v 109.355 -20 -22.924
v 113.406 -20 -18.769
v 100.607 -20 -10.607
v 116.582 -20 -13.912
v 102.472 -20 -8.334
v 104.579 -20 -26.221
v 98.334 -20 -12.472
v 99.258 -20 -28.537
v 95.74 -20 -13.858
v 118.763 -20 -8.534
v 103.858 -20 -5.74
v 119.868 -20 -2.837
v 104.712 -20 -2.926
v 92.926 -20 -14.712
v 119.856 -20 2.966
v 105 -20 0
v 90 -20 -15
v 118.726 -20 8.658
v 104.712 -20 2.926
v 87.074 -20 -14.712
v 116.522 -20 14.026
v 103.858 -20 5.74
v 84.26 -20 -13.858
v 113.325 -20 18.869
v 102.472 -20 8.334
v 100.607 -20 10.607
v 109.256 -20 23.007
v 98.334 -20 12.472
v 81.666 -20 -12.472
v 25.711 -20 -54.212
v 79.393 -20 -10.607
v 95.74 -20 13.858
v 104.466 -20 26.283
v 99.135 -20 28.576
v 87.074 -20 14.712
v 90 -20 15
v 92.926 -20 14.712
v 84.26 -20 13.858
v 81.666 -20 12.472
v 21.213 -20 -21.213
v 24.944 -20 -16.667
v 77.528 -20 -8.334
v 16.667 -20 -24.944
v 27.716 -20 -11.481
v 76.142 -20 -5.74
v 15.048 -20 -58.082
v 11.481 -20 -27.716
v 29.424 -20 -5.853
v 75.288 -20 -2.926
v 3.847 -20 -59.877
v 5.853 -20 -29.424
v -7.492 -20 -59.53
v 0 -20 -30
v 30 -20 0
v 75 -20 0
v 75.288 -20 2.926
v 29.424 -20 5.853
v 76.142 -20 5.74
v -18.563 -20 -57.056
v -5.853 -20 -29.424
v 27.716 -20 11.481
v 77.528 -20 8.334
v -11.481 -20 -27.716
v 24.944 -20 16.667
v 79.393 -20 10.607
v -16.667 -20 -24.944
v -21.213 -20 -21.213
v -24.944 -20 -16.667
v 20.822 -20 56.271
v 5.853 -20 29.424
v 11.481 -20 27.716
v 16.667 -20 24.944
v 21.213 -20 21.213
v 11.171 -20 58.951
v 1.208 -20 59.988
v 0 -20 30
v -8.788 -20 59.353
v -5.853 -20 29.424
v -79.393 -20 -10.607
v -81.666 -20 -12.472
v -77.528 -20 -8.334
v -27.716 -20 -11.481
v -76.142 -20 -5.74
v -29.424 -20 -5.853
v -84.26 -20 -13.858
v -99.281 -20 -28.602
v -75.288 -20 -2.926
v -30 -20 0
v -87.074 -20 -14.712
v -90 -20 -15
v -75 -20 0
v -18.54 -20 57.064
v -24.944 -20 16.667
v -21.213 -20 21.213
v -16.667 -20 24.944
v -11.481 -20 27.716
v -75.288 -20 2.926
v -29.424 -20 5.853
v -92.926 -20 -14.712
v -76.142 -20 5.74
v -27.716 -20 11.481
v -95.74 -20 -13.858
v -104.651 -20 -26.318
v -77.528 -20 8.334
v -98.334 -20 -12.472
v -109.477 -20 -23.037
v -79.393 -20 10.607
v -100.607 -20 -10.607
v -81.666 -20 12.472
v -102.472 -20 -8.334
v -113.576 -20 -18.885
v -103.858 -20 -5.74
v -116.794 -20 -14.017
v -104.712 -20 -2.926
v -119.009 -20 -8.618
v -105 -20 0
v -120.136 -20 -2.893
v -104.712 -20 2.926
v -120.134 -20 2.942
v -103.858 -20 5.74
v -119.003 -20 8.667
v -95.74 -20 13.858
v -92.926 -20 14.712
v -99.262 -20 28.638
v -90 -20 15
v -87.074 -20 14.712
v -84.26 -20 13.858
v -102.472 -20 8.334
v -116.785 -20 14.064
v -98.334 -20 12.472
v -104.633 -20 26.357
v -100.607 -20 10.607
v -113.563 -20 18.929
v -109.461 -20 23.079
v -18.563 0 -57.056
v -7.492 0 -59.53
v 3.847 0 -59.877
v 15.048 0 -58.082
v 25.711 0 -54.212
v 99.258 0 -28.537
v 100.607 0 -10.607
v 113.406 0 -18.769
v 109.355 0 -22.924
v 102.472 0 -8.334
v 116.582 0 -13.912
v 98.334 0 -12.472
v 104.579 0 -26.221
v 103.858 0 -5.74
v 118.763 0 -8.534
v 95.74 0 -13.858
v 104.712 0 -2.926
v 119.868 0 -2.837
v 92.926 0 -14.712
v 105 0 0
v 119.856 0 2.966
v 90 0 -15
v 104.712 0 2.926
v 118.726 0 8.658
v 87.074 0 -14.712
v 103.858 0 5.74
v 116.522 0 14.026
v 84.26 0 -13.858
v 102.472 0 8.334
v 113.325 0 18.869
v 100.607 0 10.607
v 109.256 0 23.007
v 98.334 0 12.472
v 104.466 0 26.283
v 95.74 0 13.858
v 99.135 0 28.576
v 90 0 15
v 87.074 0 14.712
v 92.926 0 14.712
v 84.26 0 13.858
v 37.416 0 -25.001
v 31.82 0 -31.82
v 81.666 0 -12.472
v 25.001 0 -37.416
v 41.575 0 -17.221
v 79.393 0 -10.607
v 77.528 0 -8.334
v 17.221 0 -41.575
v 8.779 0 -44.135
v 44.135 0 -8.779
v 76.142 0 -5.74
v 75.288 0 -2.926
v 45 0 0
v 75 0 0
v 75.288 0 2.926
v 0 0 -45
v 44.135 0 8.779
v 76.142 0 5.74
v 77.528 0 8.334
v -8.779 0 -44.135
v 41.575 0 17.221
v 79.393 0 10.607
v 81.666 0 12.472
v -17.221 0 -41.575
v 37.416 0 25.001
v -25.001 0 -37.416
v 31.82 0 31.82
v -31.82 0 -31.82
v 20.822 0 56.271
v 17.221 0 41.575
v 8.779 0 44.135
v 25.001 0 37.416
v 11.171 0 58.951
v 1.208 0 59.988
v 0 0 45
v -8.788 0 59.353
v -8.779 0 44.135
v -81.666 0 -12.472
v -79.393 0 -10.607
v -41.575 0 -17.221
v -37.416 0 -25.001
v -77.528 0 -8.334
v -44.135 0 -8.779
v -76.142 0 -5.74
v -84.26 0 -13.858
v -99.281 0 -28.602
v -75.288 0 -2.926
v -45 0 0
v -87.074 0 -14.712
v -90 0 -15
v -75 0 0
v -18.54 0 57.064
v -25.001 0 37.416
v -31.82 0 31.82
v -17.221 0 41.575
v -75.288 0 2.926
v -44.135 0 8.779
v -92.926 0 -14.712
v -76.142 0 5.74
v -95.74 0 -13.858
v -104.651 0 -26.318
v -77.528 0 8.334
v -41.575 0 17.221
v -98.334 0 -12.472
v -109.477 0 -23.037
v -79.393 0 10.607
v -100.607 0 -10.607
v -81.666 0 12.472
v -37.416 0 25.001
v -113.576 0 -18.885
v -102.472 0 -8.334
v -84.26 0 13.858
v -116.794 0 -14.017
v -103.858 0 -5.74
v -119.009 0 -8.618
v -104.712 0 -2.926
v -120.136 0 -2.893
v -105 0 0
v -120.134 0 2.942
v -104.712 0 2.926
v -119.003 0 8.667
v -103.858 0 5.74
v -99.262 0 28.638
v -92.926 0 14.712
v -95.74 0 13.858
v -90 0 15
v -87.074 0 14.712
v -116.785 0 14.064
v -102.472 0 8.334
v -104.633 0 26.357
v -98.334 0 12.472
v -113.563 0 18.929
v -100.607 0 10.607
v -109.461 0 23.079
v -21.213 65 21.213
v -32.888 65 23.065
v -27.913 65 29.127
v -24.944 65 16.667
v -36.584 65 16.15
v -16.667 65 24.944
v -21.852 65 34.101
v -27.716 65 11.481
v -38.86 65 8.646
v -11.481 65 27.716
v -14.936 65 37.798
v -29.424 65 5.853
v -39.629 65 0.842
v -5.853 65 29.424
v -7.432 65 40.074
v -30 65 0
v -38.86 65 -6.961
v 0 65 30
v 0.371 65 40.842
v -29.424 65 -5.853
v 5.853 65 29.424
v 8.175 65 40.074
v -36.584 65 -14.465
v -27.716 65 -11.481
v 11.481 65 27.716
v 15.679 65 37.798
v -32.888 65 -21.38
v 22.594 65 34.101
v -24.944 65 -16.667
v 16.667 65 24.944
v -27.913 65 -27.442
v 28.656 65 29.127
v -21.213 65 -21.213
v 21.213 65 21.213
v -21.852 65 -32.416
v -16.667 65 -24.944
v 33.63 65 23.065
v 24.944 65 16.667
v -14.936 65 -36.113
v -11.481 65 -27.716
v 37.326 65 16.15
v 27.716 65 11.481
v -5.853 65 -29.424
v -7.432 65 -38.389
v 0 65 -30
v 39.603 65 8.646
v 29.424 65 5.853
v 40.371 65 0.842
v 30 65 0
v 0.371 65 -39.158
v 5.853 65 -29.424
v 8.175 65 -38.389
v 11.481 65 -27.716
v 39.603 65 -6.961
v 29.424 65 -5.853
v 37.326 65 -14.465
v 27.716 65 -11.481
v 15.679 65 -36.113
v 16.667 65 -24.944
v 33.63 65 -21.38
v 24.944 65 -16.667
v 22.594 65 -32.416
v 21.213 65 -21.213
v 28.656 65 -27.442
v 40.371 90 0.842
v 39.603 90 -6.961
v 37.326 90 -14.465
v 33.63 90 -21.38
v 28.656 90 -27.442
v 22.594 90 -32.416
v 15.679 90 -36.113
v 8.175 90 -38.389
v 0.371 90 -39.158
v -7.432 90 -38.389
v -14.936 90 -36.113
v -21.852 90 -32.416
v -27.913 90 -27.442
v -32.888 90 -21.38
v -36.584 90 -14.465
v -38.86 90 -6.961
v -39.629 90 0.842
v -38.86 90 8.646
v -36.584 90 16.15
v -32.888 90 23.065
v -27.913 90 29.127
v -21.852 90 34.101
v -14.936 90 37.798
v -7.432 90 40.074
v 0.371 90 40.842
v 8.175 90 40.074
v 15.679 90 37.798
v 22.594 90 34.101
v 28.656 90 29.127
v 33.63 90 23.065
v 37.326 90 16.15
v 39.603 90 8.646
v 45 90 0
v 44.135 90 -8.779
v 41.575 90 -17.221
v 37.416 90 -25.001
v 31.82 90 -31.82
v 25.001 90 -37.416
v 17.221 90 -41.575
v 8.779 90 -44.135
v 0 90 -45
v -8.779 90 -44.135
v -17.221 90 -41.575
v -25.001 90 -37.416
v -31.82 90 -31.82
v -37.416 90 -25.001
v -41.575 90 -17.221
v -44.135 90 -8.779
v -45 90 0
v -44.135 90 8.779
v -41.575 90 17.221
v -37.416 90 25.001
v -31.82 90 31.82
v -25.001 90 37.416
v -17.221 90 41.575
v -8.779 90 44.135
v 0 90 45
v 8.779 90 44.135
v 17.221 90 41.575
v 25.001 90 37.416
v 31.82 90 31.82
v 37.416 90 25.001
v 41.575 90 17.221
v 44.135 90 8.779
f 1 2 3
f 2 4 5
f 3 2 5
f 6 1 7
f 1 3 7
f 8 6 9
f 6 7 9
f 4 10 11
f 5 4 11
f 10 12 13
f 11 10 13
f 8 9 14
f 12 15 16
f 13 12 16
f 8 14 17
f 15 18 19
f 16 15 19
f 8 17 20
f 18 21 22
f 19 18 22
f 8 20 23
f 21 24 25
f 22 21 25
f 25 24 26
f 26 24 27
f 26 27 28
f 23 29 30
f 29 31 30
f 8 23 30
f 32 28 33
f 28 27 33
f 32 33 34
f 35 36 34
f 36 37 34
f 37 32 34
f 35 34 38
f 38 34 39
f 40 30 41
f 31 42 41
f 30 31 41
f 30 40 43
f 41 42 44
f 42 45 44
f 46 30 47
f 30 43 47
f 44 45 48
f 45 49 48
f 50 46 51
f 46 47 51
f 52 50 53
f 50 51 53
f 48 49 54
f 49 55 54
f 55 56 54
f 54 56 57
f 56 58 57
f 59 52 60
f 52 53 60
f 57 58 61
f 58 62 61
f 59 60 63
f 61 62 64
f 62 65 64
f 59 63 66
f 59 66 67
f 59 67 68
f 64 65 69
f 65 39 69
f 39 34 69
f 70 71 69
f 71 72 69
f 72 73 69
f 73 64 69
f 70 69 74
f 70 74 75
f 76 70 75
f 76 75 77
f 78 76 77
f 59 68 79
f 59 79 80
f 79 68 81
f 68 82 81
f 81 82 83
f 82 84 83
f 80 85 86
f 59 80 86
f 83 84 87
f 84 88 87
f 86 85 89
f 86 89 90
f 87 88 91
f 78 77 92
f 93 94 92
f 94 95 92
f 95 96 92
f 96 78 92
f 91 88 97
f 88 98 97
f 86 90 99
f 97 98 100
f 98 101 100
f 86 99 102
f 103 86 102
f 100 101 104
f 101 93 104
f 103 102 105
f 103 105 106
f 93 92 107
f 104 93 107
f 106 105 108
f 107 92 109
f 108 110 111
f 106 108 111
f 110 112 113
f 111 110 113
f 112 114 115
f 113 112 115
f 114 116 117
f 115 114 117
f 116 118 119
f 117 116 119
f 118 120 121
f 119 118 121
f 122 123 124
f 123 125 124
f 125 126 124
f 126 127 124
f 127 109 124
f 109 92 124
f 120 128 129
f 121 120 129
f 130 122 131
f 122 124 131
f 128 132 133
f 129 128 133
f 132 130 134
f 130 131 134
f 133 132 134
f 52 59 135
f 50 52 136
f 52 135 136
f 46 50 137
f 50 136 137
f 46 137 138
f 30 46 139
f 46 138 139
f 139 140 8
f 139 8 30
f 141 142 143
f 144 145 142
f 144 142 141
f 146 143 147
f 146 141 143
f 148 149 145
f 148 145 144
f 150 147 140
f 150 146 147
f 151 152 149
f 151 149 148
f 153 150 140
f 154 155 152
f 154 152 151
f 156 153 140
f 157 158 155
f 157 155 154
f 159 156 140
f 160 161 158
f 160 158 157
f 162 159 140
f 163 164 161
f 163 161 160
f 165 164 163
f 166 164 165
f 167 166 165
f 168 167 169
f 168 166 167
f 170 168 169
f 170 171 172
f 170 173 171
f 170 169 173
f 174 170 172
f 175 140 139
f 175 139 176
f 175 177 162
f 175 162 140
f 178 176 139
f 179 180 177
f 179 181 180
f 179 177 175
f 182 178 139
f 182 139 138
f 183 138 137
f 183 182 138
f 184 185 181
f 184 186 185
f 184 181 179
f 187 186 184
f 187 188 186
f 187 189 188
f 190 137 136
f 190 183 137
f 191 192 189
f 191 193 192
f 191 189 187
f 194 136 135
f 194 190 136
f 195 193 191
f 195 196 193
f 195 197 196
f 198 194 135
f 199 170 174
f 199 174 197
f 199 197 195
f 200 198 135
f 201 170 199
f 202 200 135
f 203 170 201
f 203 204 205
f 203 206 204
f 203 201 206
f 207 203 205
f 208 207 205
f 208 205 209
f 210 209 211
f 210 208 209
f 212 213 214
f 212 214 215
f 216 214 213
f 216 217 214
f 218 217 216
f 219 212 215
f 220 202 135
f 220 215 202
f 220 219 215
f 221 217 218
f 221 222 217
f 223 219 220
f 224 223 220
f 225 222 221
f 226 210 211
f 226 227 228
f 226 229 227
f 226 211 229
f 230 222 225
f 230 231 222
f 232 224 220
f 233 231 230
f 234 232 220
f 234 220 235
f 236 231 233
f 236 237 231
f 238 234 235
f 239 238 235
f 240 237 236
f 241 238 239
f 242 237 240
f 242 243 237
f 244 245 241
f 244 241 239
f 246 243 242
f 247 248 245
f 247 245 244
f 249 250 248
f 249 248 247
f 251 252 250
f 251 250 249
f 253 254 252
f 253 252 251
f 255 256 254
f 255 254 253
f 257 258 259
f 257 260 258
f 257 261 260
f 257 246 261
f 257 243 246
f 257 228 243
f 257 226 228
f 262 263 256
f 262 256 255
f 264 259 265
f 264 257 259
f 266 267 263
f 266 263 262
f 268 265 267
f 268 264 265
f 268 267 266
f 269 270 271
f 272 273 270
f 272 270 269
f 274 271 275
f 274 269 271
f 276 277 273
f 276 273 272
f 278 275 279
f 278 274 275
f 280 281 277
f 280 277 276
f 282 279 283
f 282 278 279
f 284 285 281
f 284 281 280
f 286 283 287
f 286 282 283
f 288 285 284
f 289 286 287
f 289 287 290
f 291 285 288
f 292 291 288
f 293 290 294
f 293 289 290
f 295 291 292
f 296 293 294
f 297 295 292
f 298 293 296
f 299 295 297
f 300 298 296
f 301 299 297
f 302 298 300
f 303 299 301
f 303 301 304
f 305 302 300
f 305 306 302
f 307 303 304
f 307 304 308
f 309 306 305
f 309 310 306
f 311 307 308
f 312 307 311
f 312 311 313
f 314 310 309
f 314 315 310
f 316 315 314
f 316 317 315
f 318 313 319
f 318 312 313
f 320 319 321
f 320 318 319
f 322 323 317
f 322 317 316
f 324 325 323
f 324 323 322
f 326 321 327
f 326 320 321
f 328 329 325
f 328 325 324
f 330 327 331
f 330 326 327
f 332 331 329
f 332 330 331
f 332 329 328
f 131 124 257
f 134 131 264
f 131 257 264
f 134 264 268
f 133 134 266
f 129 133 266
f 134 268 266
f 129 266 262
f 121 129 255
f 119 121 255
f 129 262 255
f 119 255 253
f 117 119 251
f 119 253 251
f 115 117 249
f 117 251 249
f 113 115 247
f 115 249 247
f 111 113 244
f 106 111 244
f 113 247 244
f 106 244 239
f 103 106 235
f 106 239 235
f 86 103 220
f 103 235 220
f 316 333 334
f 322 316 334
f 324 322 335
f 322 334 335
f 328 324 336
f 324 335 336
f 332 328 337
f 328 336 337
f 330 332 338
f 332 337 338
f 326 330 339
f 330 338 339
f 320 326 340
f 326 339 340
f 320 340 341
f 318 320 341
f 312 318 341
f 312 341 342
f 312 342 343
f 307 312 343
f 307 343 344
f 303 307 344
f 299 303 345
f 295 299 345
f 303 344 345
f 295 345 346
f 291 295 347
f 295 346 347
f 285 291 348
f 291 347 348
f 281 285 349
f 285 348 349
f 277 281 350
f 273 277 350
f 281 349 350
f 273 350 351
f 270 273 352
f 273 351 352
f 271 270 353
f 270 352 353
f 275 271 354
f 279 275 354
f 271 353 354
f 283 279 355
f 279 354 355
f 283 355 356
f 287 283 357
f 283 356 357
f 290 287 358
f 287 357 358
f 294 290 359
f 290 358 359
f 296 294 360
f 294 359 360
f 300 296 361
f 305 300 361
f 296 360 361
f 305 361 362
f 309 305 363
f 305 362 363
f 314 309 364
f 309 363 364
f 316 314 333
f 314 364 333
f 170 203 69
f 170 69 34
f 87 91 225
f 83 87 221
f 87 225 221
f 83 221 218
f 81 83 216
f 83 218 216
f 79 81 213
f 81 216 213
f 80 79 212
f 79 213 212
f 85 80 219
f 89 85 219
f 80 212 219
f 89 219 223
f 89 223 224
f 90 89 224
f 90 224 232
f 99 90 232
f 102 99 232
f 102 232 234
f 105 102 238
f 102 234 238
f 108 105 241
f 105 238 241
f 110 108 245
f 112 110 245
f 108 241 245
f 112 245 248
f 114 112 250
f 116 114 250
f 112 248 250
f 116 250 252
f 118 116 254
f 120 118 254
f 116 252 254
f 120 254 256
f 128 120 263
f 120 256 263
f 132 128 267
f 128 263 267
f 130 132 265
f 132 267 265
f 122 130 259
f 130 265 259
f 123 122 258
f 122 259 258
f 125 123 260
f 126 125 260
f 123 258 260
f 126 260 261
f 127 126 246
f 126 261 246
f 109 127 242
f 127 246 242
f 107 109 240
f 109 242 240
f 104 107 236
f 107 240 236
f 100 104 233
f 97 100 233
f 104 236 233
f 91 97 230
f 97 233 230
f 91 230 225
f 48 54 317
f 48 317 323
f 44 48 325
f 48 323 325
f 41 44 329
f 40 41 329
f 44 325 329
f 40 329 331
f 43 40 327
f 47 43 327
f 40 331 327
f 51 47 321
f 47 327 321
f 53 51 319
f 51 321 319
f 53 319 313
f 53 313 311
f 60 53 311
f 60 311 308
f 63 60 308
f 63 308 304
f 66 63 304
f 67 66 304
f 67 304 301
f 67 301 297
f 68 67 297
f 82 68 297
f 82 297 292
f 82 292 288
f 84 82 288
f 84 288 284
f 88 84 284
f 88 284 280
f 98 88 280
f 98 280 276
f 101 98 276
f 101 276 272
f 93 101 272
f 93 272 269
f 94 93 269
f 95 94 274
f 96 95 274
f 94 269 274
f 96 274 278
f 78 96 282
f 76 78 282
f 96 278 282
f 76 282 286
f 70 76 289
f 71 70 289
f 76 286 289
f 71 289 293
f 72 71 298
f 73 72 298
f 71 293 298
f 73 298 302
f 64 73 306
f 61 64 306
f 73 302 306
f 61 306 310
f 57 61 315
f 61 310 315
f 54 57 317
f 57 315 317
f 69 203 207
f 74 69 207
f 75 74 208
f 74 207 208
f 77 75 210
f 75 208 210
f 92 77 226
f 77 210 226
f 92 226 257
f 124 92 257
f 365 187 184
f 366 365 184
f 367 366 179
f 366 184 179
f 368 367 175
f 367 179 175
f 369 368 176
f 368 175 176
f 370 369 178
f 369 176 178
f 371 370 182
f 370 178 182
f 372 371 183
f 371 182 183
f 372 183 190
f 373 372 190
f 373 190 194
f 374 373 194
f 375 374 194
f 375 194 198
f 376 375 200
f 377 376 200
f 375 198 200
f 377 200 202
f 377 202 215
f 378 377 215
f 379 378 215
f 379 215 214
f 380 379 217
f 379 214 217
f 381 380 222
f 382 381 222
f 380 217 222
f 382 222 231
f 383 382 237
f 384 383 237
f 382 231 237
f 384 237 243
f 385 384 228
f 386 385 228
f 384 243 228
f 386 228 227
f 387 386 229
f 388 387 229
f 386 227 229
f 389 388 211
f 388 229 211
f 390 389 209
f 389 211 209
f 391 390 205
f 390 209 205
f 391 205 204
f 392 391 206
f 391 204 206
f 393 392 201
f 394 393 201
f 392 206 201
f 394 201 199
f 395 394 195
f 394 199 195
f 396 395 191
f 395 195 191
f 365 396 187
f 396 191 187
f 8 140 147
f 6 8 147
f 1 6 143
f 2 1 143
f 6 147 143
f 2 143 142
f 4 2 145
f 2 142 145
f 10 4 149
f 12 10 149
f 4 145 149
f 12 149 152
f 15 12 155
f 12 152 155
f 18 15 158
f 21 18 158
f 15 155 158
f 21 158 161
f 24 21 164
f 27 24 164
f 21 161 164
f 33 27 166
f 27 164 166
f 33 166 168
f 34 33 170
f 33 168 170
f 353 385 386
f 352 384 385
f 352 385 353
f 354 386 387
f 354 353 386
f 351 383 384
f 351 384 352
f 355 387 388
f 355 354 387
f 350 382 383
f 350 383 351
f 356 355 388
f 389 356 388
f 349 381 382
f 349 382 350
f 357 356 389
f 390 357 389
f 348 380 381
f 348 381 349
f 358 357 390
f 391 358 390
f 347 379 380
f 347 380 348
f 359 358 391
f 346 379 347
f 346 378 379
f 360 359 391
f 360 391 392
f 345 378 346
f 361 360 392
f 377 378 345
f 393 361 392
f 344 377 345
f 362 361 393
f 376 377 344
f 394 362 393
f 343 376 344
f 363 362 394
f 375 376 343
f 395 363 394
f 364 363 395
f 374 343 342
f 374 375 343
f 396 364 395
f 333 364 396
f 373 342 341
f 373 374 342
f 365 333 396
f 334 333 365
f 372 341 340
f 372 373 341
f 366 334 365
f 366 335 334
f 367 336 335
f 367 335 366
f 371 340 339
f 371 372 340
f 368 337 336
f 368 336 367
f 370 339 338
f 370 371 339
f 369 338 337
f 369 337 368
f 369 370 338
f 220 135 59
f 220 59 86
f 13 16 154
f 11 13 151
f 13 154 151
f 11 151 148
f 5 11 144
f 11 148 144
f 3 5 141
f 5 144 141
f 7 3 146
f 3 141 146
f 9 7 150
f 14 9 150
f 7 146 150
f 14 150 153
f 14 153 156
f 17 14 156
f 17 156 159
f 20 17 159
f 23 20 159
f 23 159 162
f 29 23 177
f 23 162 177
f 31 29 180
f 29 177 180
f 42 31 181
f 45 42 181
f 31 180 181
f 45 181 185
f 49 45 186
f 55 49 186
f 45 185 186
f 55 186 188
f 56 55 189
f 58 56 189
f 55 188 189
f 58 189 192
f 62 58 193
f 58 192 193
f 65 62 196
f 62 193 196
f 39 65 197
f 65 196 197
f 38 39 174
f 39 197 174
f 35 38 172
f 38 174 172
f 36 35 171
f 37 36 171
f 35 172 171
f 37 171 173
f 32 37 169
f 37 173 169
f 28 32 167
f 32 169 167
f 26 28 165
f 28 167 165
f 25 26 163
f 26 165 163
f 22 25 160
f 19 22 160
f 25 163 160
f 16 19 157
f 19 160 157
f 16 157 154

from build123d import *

# Parameters (mm, degrees)
PAD_DEPTH       = 20
SKETCH002_R     = 15
POCKET001_DEPTH = 20
SKETCH003_R     = 15
POCKET002_DEPTH = 20
SKETCH_R        = 45
PAD001_DEPTH    = 90
SKETCH004_R     = 40
POCKET_DEPTH    = 25
SKETCH005_R     = 30
POCKET003_DEPTH = 110


with BuildPart() as part:
    # Sketch001 → Pad (new body)
    with BuildSketch(Plane.XZ):
        with BuildLine():
            Line((20.821842, 56.271226), (99.135441, 28.576132))
            ThreePointArc((99.258042, -28.53666), (120.002757, 0.064399), (99.135441, 28.576132))
            Line((99.258042, -28.53666), (25.71069, -54.21218))
            ThreePointArc((-18.562526, -57.056399), (3.846616, -59.876569), (25.71069, -54.21218))
            Line((-18.562526, -57.056399), (-99.28142, -28.602251))
            ThreePointArc((-99.262461, 28.63761), (-120.277525, 0.024636), (-99.28142, -28.602251))
            Line((-18.539501, 57.063884), (-99.262461, 28.63761))
            ThreePointArc((20.821842, 56.271226), (1.208034, 59.987838), (-18.539501, 57.063884))
        make_face()
    extrude(amount=PAD_DEPTH)

    # Sketch002 → Pocket001 (cut)
    with BuildSketch(Plane(origin=(0, 0, 0), x_dir=(1, 0, 0), z_dir=(0, 1, 0))):
        with Locations((-90, 0)):
            Circle(SKETCH002_R)
    extrude(amount=-POCKET001_DEPTH, mode=Mode.SUBTRACT)

    # Sketch003 (on Face4 of Pocket001) → Pocket002 (cut)
    with BuildSketch(Plane(origin=(0, 0, 0), x_dir=(1, 0, 0), z_dir=(0, 1, 0))):
        with Locations((90, 0)):
            Circle(SKETCH003_R)
    extrude(amount=-POCKET002_DEPTH, mode=Mode.SUBTRACT)

    # Sketch (on Face9 of Pad) → Pad001 (join)
    with BuildSketch(Plane(origin=(0, 0, 0), x_dir=(1, 0, 0), z_dir=(0, 1, 0))):
        Circle(SKETCH_R)
    extrude(amount=PAD001_DEPTH)

    # Sketch004 (on Face14 of Pad001) → Pocket (cut)
    with BuildSketch(Plane(origin=(0, 90, 0), x_dir=(1, 0, 0), z_dir=(0, 1, 0))):
        with Locations((0.371243, -0.842497)):
            Circle(SKETCH004_R)
    extrude(amount=-POCKET_DEPTH, mode=Mode.SUBTRACT)

    # Sketch005 (on Face16 of Pocket) → Pocket003 (cut)
    with BuildSketch(Plane(origin=(0, 65, 0), x_dir=(1, 0, 0), z_dir=(0, 1, 0))):
        Circle(SKETCH005_R)
    extrude(amount=-POCKET003_DEPTH, mode=Mode.SUBTRACT)


solid = part.part
